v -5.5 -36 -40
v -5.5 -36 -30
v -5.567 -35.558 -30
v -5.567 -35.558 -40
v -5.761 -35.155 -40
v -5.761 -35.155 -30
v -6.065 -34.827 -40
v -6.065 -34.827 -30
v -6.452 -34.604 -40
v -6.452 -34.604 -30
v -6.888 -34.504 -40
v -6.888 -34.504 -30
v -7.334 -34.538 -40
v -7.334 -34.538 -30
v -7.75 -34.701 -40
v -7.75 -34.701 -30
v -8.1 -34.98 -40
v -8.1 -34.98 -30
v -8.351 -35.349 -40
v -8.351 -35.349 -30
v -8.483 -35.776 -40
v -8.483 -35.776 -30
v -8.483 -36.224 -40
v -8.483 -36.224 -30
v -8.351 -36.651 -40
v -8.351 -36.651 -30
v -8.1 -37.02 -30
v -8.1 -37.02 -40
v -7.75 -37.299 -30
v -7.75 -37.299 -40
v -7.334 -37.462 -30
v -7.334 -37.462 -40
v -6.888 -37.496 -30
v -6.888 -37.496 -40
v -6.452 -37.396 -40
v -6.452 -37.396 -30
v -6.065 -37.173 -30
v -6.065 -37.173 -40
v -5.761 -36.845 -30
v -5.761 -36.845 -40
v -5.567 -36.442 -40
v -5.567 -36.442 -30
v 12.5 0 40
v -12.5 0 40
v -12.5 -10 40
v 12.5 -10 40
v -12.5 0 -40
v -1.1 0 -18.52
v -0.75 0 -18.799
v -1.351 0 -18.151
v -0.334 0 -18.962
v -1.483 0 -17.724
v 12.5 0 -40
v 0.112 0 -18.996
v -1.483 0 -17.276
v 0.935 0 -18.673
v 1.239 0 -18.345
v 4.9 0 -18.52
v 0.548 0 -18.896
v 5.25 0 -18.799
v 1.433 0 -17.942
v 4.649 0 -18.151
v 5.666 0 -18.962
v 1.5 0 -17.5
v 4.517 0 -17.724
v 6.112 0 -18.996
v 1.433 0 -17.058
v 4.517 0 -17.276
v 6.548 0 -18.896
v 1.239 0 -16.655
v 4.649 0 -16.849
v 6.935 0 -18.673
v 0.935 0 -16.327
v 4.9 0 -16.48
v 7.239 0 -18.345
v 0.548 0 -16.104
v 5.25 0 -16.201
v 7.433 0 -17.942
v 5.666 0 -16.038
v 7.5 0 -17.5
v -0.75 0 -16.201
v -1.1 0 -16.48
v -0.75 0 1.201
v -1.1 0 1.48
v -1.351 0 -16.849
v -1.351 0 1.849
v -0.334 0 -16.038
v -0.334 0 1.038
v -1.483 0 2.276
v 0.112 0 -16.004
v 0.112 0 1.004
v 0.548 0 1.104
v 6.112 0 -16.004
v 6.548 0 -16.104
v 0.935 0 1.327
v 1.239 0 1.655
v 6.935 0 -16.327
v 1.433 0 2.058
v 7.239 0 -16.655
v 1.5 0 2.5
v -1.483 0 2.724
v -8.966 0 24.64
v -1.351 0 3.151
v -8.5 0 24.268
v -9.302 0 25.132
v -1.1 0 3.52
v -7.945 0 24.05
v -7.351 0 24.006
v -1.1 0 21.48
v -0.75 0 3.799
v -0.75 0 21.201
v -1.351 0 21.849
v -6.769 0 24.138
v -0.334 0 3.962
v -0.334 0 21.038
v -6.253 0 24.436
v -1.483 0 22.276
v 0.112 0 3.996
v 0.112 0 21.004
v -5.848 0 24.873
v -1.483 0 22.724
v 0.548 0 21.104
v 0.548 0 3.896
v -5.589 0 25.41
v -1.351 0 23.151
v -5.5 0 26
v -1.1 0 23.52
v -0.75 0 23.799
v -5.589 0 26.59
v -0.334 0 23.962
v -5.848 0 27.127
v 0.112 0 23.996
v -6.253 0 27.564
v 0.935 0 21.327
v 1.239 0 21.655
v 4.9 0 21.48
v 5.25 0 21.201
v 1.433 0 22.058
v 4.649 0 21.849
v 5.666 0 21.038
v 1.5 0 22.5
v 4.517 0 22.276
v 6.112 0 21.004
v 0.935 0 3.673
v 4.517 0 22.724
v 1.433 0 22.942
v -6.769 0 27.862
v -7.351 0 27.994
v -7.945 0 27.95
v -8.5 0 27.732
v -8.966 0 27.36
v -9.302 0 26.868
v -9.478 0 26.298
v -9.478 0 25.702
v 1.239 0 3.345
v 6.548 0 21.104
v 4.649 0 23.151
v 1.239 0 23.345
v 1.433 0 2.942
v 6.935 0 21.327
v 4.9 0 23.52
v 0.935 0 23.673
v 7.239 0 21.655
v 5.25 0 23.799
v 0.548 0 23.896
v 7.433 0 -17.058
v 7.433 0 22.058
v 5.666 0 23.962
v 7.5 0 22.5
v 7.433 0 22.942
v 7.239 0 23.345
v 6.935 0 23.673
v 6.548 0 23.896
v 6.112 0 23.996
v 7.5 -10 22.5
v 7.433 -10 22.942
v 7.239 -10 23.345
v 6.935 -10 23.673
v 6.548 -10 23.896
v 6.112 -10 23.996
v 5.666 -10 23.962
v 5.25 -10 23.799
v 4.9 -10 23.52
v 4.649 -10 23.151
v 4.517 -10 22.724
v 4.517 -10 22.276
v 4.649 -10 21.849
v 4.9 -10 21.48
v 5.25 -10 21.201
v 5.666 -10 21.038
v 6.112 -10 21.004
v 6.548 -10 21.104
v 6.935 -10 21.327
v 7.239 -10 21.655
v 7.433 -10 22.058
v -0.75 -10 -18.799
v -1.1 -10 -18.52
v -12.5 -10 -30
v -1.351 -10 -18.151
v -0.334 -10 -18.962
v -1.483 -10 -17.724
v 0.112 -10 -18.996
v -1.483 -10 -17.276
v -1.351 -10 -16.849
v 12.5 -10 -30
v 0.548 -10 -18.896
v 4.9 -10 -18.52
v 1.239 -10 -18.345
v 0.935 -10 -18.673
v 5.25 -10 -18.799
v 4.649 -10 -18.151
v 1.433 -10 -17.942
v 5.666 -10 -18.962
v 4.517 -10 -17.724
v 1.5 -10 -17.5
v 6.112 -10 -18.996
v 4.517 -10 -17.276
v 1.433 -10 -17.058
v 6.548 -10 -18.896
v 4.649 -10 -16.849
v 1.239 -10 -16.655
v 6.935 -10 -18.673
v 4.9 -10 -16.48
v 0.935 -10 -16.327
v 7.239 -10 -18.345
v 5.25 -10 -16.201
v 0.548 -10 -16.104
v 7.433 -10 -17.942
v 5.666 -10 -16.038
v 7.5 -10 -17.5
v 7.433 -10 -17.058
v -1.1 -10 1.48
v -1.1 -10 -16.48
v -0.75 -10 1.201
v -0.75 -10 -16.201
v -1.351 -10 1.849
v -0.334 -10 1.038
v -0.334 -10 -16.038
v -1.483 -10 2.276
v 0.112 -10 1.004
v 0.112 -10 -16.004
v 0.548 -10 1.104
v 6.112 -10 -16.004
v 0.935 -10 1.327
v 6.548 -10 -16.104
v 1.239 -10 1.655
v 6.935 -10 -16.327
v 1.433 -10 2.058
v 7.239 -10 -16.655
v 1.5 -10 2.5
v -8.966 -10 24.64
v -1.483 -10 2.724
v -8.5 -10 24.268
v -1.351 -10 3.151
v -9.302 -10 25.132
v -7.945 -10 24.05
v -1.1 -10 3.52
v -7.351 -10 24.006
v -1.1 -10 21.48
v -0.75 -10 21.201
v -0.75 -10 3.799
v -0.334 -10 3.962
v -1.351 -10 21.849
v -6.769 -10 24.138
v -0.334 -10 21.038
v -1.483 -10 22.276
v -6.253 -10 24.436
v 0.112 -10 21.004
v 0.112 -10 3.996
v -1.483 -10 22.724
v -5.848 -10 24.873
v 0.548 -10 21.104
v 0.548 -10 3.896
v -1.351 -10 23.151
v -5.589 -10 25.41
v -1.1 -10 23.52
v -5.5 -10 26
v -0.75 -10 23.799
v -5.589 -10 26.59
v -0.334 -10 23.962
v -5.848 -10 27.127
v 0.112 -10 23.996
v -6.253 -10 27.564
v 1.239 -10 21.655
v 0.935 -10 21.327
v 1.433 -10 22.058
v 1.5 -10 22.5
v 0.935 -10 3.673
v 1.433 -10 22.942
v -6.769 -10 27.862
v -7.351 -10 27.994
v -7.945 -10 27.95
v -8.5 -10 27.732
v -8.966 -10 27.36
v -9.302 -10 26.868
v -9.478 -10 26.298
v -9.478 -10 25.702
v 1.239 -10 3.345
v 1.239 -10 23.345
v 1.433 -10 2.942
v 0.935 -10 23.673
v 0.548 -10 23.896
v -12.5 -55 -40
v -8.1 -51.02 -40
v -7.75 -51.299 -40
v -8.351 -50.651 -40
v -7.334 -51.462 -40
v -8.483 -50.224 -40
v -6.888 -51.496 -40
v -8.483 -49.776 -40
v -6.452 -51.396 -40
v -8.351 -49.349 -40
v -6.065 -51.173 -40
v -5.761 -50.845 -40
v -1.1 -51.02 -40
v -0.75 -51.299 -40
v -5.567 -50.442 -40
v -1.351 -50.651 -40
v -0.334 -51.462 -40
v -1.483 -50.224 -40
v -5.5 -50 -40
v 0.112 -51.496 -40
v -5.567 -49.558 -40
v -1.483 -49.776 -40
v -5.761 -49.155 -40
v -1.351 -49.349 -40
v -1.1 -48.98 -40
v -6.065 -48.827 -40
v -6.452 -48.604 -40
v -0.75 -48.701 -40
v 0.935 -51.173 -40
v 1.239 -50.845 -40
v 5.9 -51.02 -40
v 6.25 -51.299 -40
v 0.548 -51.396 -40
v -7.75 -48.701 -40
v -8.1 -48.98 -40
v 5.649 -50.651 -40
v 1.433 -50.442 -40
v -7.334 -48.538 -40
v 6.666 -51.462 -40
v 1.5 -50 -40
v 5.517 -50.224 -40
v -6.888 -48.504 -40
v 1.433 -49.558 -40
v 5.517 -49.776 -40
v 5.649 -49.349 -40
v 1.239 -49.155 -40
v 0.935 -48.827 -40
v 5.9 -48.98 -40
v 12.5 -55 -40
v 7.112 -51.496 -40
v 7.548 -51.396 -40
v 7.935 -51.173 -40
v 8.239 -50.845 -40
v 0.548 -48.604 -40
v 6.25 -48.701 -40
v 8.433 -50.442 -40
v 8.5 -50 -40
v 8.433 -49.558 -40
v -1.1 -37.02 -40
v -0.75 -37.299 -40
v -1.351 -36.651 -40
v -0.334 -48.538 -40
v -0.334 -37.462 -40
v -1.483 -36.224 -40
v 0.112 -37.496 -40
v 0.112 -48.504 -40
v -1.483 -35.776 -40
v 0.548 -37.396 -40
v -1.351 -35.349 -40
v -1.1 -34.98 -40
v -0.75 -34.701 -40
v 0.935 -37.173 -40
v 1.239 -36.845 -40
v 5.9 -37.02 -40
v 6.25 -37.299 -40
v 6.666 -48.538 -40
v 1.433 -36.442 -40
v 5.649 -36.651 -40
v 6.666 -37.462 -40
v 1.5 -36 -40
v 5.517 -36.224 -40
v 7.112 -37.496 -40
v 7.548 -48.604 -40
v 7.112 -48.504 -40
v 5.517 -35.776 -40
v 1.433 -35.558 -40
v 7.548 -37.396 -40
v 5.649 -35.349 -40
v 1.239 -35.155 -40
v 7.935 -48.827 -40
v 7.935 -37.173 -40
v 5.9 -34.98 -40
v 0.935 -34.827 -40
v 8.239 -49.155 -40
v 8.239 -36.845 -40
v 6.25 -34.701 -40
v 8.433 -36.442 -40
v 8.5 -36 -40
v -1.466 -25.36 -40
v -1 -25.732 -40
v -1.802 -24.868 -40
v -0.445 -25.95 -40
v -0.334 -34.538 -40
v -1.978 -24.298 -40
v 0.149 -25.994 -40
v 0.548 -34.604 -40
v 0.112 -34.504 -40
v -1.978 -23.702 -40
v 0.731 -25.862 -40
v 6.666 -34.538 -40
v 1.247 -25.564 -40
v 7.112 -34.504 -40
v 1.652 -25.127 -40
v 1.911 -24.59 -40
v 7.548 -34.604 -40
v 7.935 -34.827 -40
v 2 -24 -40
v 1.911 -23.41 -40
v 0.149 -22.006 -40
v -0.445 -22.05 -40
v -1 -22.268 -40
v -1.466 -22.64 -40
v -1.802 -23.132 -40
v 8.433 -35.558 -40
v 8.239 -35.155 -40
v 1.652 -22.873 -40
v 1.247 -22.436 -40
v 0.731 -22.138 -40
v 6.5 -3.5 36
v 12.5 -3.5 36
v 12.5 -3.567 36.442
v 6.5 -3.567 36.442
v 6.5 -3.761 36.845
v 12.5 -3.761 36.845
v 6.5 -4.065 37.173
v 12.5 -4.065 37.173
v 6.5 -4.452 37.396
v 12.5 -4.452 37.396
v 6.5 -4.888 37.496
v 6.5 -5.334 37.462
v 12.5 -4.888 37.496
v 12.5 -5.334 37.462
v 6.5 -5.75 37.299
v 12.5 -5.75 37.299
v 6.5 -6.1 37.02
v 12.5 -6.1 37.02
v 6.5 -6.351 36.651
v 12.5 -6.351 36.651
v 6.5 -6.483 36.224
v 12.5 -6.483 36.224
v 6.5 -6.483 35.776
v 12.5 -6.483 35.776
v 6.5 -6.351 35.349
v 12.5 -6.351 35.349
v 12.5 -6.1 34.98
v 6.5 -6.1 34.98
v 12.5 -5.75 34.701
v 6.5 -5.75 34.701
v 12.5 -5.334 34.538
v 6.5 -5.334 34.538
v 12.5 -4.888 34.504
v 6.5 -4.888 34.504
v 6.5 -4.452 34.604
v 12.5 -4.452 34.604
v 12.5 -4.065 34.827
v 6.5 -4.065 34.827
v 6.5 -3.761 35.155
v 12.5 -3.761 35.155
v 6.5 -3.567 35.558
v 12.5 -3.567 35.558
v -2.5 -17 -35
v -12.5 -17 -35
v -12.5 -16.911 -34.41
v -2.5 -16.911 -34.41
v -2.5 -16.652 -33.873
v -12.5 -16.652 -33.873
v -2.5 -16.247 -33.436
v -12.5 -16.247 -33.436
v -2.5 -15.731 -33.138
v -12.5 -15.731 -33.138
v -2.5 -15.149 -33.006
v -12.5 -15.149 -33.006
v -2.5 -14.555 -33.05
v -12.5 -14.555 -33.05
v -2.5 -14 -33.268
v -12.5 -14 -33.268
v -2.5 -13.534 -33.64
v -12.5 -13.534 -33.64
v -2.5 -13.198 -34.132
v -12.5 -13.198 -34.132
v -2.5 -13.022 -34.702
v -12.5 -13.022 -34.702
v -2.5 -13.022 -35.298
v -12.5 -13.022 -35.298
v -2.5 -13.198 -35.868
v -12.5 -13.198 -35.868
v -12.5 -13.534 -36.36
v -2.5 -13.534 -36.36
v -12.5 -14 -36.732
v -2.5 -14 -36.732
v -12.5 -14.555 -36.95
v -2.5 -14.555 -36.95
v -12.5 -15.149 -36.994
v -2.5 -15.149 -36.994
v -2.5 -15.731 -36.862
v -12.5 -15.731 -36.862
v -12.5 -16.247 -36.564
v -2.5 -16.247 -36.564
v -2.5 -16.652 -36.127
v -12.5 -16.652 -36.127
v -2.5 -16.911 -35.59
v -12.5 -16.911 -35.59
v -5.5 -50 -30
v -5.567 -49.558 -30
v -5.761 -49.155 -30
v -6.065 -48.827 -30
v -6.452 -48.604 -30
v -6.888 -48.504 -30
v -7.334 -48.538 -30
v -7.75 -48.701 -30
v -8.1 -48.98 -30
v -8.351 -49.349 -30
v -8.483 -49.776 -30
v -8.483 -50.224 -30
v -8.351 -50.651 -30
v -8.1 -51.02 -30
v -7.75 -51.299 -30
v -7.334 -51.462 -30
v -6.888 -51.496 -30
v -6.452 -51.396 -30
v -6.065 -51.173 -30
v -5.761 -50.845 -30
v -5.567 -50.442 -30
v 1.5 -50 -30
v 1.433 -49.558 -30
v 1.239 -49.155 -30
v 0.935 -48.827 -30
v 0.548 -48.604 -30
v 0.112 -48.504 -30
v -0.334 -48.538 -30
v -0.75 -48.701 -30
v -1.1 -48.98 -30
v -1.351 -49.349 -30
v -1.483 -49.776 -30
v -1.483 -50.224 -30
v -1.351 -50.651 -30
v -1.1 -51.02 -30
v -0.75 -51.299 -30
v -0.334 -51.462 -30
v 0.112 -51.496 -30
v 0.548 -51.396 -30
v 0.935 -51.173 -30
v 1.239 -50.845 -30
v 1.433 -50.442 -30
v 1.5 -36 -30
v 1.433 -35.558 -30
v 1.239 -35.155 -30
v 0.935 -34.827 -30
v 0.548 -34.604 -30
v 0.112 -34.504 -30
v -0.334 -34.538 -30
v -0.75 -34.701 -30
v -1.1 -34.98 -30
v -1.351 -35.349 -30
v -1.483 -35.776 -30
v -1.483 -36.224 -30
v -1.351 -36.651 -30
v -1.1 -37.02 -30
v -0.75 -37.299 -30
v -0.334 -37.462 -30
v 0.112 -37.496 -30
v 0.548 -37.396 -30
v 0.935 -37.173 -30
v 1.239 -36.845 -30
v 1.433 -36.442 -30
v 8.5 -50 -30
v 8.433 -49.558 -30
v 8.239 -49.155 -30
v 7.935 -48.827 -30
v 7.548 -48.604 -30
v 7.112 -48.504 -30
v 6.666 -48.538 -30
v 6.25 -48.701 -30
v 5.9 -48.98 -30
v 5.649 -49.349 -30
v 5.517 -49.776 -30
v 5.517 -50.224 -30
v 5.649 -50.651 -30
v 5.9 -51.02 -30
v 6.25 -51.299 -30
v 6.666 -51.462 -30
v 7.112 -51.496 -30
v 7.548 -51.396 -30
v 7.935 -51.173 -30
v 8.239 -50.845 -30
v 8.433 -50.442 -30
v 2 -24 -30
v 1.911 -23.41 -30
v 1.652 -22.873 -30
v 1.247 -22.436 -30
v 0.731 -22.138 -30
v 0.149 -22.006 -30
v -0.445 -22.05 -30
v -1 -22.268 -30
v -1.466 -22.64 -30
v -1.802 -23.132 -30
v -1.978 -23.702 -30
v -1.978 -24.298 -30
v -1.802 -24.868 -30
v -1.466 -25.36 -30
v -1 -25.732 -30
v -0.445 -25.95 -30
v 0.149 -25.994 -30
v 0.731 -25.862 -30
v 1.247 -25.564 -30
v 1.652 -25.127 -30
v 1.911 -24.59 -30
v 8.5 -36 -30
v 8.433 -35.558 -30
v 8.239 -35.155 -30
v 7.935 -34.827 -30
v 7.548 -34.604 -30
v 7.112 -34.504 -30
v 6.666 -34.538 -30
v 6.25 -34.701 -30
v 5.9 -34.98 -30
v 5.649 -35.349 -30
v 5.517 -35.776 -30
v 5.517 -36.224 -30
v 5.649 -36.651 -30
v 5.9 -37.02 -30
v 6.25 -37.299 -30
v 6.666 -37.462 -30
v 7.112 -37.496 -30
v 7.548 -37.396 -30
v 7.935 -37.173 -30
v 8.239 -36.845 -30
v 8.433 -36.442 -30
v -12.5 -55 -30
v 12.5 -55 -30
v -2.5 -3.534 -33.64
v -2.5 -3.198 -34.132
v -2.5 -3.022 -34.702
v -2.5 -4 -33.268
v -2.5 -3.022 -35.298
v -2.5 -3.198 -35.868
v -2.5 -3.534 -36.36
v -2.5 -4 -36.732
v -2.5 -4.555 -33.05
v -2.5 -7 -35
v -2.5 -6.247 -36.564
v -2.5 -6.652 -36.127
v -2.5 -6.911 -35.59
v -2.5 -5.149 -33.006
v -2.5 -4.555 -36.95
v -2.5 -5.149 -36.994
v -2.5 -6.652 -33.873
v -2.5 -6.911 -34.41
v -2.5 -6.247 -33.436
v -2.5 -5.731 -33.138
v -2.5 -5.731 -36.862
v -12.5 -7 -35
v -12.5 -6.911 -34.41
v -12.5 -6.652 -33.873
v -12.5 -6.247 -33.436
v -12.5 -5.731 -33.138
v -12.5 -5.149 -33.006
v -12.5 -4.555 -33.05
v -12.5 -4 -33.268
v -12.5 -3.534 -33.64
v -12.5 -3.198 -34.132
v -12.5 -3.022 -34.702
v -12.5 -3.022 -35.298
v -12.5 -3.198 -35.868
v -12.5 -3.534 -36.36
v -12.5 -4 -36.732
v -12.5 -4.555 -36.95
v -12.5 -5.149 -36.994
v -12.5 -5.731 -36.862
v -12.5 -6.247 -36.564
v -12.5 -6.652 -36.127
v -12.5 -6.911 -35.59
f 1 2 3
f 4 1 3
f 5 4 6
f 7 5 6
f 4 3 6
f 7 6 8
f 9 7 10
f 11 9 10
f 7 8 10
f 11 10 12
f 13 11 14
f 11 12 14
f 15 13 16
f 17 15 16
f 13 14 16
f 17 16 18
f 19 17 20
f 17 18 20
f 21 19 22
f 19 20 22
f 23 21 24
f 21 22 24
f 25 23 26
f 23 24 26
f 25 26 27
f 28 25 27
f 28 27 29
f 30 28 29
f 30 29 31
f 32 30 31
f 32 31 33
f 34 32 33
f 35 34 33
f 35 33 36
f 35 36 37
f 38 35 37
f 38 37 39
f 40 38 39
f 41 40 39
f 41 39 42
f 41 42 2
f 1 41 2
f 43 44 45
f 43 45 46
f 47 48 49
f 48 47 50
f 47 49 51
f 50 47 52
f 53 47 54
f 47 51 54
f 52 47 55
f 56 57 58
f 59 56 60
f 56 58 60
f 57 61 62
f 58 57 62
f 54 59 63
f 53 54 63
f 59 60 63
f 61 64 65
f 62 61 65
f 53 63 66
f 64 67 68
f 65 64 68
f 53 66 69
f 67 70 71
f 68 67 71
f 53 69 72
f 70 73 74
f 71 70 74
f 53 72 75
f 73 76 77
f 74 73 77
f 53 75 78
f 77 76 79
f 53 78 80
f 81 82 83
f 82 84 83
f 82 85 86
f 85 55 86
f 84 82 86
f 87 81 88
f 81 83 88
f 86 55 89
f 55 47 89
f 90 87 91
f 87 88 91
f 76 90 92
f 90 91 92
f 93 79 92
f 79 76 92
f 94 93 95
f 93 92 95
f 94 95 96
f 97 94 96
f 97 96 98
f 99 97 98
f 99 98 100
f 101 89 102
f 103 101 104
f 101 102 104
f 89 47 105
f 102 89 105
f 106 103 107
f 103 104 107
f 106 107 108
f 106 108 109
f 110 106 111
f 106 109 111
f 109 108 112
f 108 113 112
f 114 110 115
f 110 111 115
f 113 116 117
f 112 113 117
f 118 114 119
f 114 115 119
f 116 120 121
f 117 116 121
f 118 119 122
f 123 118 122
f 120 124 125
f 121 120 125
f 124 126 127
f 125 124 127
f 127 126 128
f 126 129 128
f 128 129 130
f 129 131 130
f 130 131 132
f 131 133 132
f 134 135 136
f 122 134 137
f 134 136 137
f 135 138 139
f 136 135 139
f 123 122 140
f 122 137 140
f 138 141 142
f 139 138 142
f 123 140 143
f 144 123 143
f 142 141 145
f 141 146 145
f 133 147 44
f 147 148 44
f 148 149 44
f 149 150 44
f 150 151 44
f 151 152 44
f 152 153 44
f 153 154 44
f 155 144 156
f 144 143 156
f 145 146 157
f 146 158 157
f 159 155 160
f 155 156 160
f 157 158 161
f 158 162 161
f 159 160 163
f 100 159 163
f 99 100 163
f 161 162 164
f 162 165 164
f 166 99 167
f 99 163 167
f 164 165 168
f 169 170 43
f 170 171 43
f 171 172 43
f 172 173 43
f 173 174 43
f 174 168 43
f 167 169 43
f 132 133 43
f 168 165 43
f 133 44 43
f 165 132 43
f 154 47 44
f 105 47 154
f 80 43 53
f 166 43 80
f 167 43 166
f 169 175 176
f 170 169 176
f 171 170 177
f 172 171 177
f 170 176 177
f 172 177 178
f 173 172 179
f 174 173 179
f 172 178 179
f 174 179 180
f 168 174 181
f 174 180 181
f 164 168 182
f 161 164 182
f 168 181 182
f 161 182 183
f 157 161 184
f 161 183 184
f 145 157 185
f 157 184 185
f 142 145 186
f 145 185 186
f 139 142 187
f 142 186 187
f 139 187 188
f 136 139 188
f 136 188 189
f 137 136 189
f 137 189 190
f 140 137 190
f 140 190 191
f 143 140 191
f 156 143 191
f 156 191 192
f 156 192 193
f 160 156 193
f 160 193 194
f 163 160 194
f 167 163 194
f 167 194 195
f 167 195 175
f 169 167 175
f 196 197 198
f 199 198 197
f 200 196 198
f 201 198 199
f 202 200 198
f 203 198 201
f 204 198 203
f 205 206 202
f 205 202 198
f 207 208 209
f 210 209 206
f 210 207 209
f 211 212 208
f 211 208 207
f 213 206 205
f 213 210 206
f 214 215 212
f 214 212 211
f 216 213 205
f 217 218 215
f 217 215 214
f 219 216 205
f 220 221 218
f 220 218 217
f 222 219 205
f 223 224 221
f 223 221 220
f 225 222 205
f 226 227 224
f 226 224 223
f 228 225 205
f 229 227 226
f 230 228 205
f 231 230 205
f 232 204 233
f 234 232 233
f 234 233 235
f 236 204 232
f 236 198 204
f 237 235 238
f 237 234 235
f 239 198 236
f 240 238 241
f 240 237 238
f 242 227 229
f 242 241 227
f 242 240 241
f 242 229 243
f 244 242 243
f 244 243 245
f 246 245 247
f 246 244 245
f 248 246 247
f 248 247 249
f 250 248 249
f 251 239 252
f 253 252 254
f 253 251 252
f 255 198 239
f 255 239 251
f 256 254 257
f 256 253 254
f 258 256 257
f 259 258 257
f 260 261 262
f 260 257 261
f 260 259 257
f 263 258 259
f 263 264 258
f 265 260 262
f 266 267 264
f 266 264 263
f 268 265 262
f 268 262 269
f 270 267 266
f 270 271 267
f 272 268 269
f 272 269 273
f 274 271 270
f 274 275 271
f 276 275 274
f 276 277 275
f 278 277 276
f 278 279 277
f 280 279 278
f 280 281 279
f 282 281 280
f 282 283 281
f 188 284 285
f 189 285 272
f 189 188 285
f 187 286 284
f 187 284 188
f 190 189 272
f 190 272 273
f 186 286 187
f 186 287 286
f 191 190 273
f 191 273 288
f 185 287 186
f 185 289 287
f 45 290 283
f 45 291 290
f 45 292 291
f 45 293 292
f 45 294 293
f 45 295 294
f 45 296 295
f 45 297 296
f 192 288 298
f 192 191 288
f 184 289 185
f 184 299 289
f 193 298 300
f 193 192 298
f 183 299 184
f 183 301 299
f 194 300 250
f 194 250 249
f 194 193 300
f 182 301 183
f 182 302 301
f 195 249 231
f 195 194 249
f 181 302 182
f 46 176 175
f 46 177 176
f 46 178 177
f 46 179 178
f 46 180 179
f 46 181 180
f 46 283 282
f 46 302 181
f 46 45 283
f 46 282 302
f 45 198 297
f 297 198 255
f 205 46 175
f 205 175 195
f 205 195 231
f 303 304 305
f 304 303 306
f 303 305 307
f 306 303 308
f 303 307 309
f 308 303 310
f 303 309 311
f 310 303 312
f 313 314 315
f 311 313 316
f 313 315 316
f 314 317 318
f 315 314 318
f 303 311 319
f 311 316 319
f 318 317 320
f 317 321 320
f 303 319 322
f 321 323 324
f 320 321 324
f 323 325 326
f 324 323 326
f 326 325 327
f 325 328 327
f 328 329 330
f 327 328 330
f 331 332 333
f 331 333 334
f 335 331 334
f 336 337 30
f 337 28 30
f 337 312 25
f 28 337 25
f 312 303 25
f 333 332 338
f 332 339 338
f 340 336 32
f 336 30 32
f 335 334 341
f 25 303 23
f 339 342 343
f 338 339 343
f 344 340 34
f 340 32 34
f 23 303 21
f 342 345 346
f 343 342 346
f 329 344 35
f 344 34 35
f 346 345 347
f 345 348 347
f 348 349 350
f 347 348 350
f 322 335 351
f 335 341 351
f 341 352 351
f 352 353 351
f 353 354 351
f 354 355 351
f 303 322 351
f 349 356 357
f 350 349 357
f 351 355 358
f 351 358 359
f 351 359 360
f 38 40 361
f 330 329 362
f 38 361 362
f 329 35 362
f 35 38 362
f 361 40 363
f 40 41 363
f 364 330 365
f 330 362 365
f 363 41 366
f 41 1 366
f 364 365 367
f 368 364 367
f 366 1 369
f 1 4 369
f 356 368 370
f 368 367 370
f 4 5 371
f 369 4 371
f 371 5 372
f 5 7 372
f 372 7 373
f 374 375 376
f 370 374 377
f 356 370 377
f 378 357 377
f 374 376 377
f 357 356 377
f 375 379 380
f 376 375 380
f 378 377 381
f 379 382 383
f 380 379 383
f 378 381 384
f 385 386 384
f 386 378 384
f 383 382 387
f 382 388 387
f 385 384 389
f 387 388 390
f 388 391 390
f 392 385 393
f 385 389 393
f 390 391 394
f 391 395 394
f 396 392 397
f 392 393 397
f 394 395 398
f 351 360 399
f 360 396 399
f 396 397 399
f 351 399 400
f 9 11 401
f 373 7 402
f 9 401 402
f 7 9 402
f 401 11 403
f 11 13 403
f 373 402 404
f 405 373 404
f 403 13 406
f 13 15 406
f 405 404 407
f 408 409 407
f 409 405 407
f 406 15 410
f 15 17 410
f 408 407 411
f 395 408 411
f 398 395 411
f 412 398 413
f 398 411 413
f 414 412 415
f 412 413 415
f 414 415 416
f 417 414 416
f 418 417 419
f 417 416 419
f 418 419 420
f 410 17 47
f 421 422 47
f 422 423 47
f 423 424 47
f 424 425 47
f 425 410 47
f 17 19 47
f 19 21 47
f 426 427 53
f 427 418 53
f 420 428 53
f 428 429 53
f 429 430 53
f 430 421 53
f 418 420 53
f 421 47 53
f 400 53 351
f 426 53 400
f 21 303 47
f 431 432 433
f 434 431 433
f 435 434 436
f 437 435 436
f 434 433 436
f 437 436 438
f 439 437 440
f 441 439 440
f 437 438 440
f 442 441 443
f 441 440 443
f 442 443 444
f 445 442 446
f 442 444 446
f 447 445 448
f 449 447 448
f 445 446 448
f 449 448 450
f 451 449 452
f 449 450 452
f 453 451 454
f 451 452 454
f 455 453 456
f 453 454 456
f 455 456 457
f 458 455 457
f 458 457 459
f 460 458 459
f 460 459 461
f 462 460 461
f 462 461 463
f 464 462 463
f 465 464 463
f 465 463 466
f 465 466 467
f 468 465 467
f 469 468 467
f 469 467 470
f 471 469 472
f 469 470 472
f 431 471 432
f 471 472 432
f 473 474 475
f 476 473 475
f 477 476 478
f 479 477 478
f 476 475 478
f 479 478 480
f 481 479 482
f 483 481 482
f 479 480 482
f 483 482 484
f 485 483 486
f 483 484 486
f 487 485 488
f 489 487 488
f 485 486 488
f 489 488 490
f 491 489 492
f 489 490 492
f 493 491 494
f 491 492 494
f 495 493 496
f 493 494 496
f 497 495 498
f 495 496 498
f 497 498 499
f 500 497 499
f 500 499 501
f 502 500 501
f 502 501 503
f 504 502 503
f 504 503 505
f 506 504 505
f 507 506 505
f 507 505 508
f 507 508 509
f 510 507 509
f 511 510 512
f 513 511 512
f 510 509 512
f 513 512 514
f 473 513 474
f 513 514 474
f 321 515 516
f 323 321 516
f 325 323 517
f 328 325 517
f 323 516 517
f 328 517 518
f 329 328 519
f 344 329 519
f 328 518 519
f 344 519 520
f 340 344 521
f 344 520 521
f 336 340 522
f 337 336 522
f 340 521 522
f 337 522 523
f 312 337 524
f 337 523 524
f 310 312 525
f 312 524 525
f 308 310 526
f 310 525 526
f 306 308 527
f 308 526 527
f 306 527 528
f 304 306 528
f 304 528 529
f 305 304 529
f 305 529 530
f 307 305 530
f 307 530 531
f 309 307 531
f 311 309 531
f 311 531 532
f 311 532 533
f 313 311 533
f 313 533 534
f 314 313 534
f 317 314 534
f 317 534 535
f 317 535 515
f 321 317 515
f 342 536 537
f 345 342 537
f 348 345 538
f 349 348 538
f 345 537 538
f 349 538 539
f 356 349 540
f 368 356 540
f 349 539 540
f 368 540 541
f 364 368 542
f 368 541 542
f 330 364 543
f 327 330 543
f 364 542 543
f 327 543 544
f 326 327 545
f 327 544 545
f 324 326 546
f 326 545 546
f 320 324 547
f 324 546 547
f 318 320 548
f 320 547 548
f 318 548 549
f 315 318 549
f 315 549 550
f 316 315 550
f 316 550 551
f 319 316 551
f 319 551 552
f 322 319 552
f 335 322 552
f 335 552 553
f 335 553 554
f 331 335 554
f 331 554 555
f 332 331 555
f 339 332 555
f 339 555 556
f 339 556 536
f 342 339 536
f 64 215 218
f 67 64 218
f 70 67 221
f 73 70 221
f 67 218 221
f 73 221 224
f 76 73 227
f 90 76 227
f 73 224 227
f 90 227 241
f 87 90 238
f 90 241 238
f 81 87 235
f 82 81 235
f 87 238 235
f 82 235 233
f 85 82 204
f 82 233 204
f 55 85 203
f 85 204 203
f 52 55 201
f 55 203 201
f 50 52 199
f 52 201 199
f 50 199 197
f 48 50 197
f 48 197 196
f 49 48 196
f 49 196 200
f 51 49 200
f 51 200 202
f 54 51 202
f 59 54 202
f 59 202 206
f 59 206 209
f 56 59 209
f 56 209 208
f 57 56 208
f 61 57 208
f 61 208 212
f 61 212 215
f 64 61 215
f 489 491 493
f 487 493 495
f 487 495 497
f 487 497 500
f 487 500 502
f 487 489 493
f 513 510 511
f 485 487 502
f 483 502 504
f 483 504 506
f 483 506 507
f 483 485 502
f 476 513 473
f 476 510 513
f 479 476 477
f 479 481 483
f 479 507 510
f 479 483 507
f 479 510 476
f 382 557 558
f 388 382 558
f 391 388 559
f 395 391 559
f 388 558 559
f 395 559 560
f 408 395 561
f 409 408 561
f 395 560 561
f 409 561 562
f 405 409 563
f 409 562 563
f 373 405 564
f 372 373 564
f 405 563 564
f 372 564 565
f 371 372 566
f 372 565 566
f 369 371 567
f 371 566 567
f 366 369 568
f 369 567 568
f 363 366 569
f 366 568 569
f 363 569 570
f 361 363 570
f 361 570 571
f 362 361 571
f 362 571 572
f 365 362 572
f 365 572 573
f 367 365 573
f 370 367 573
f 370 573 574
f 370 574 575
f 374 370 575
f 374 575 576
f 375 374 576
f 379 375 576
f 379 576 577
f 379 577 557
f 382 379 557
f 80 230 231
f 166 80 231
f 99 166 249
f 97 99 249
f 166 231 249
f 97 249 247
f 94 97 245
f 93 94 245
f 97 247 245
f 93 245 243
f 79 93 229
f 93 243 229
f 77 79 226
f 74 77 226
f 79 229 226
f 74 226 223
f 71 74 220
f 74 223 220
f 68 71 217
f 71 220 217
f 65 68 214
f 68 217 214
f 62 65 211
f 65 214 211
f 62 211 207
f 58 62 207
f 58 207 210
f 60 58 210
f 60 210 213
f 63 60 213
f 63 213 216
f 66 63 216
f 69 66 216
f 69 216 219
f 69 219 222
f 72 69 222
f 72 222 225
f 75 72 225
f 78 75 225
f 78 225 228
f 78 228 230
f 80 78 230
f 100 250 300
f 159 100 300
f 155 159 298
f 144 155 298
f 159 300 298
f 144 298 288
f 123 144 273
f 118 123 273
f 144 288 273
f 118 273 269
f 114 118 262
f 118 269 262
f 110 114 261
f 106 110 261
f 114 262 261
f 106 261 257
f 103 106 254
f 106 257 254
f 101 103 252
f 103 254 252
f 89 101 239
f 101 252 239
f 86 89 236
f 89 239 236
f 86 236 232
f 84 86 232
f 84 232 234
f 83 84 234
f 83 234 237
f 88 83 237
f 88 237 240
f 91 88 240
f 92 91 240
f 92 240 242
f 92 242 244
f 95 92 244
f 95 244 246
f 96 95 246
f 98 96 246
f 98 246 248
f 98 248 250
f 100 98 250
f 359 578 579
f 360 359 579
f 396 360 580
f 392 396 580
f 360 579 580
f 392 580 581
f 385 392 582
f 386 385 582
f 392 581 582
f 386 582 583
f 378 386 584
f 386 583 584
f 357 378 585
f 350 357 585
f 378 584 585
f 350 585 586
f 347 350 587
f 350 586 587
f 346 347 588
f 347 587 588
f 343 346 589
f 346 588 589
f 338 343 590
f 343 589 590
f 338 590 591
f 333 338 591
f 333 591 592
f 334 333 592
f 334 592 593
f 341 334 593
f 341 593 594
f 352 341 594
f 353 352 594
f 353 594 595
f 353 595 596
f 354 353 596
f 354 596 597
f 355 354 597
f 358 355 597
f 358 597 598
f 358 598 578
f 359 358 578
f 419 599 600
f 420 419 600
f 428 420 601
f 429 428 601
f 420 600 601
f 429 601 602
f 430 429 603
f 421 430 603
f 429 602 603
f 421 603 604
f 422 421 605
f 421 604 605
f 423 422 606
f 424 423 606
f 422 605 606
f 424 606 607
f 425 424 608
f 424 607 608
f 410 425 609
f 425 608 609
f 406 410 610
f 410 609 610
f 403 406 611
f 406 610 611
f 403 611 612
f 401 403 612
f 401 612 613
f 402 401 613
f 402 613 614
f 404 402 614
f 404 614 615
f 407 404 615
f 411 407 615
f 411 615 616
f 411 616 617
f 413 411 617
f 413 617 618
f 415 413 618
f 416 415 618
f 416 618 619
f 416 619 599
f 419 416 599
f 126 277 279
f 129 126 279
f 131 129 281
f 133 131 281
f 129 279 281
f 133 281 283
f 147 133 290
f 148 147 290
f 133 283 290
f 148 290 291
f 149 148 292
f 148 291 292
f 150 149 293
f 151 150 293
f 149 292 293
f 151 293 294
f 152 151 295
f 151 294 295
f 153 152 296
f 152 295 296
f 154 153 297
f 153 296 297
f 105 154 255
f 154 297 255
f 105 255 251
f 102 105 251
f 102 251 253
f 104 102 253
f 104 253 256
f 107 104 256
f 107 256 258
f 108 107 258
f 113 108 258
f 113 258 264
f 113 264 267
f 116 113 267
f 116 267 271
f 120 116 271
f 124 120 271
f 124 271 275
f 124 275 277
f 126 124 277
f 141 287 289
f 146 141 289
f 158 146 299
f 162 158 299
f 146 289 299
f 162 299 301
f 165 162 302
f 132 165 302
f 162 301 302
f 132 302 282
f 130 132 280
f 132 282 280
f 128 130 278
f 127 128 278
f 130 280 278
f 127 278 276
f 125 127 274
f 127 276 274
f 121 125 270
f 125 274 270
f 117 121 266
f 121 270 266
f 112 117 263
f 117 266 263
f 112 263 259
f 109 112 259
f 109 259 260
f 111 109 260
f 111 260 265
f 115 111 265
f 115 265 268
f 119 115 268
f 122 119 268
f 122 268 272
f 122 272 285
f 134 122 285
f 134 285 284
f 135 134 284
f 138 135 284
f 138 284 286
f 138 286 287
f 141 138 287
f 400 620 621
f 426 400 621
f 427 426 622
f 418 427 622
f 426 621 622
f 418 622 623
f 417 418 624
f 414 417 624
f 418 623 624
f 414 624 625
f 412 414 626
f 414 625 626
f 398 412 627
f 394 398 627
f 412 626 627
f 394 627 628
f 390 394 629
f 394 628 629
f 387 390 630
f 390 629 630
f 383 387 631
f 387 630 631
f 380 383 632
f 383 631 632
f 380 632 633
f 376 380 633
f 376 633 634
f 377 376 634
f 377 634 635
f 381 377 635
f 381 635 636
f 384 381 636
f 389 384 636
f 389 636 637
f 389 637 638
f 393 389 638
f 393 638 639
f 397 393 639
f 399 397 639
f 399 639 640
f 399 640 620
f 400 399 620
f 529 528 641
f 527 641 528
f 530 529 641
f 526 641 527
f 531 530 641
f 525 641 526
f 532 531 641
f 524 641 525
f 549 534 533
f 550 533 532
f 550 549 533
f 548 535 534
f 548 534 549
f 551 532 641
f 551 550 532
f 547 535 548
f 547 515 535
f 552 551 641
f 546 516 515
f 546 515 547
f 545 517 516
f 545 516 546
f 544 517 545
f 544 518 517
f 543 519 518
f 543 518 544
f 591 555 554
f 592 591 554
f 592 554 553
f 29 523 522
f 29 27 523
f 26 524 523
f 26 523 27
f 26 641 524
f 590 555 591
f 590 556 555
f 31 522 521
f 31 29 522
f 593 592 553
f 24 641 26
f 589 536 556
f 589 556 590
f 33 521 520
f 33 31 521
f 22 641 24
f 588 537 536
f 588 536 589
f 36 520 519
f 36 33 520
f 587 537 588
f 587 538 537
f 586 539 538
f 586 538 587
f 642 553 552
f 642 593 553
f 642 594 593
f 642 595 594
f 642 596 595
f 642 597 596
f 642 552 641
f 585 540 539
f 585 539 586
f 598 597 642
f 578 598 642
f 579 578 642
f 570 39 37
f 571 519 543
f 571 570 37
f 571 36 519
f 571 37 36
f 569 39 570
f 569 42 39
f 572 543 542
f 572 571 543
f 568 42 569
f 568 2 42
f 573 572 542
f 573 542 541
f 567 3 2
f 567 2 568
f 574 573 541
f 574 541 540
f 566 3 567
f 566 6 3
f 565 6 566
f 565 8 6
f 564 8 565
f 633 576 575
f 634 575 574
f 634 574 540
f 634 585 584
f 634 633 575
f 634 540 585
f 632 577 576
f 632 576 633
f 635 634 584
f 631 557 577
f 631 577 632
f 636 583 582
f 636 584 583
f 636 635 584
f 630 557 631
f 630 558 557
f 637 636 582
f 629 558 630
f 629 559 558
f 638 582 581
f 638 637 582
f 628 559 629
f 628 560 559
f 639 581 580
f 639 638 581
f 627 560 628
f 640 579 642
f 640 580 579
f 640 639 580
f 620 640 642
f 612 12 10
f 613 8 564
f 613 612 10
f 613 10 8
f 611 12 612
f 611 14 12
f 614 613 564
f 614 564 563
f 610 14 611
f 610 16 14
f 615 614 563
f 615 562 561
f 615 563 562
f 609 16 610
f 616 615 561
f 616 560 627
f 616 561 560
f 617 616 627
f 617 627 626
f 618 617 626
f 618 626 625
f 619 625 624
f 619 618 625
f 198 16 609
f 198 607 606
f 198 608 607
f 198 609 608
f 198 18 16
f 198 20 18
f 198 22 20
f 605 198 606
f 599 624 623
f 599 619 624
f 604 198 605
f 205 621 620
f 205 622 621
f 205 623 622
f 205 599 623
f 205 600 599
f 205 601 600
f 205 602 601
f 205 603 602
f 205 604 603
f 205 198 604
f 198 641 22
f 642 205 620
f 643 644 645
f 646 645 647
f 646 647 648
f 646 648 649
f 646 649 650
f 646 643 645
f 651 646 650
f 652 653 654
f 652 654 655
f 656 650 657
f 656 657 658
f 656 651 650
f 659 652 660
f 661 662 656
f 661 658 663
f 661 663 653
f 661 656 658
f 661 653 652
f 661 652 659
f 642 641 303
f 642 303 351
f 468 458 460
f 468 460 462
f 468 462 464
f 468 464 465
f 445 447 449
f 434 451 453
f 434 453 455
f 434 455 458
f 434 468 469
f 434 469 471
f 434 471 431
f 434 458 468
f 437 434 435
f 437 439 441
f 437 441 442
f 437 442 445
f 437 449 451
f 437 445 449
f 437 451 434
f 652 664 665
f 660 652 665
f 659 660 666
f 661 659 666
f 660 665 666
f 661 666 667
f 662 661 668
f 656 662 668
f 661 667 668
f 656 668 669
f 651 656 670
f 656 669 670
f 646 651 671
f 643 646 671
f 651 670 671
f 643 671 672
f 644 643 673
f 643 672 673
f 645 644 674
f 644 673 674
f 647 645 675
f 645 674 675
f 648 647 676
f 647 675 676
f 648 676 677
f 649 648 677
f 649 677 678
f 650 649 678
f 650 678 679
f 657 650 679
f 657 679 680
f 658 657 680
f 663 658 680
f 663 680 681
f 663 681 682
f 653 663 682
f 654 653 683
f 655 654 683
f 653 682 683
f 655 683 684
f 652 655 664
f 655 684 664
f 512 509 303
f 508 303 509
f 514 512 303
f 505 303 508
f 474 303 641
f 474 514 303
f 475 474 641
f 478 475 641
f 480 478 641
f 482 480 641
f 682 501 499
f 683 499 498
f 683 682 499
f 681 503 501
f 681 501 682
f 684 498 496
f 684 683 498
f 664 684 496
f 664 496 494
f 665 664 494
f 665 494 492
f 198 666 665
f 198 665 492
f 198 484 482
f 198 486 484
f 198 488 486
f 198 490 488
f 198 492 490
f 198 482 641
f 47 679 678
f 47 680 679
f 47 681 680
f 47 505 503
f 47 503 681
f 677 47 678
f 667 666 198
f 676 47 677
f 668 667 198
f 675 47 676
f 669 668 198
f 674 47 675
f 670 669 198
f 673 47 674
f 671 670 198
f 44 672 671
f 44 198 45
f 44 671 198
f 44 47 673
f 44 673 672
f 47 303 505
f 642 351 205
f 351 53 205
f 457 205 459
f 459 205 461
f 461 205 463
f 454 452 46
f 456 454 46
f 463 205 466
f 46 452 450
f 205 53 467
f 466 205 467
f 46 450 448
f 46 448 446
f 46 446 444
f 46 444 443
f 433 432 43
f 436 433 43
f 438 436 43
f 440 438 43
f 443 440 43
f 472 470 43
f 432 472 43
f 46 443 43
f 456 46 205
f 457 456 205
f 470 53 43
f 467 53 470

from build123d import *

# Parameters (mm, degrees)
F0_W      = 25
F0_H      = 80
F1_DEPTH  = 10
F2_W      = 25
F2_H      = 10
F3_DEPTH  = 45
F4_R      = 2
F4_R_2    = 1.5
F5_DEPTH  = 10.001
F6_R      = 1.5
F7_DEPTH  = 6
F8_R      = 1.5
F8_R_2    = 2
F9_DEPTH  = 10.001
F10_R     = 2
F11_DEPTH = 10


with BuildPart() as f1:
    # F0 (on Front) → F1 (new body)
    with BuildSketch(Plane.XZ):
        Rectangle(F0_W, F0_H)
    extrude(amount=F1_DEPTH)

    # F2 (on face) → F3 (join)
    with BuildSketch(Plane.XZ.offset(10)):
        with Locations((0, -35)):
            Rectangle(F2_W, F2_H)
    extrude(amount=F3_DEPTH)

    # F4 (on face) → F5 (cut, through all)
    with BuildSketch(Plane.XZ.offset(10)):
        with Locations((-7.5, 26)):
            Circle(F4_R)
        with Locations((0, -17.5)):
            Circle(F4_R_2)
        with Locations((0, 2.5)):
            Circle(F4_R_2)
        with Locations((0, 22.5)):
            Circle(F4_R_2)
        with Locations((6, 22.5)):
            Circle(F4_R_2)
        with Locations((6, -17.5)):
            Circle(F4_R_2)
    extrude(amount=-F5_DEPTH, mode=Mode.SUBTRACT)

    # F6 (on face) → F7 (cut)
    with BuildSketch(Plane.YZ.offset(12.5)):
        with Locations((-5, 36)):
            Circle(F6_R)
    extrude(amount=-F7_DEPTH, mode=Mode.SUBTRACT)

    # F8 (on face) → F9 (cut, through all)
    with BuildSketch(Plane.XY.offset(-30)):
        with Locations((0, -36)):
            Circle(F8_R)
        with Locations((0, -24)):
            Circle(F8_R_2)
        with Locations((-7, -36)):
            Circle(F8_R)
        with Locations((7, -36)):
            Circle(F8_R)
        with Locations((0, -50)):
            Circle(F8_R)
        with Locations((-7, -50)):
            Circle(F8_R)
        with Locations((7, -50)):
            Circle(F8_R)
    extrude(amount=-F9_DEPTH, mode=Mode.SUBTRACT)

    # F10 (on face) → F11 (cut)
    with BuildSketch(Plane(origin=(-12.5, 0, 0), x_dir=(0, -1, 0), z_dir=(-1, 0, 0))):
        with Locations((5, -35)):
            Circle(F10_R)
        with Locations((15, -35)):
            Circle(F10_R)
    extrude(amount=-F11_DEPTH, mode=Mode.SUBTRACT)


solid = f1.part
